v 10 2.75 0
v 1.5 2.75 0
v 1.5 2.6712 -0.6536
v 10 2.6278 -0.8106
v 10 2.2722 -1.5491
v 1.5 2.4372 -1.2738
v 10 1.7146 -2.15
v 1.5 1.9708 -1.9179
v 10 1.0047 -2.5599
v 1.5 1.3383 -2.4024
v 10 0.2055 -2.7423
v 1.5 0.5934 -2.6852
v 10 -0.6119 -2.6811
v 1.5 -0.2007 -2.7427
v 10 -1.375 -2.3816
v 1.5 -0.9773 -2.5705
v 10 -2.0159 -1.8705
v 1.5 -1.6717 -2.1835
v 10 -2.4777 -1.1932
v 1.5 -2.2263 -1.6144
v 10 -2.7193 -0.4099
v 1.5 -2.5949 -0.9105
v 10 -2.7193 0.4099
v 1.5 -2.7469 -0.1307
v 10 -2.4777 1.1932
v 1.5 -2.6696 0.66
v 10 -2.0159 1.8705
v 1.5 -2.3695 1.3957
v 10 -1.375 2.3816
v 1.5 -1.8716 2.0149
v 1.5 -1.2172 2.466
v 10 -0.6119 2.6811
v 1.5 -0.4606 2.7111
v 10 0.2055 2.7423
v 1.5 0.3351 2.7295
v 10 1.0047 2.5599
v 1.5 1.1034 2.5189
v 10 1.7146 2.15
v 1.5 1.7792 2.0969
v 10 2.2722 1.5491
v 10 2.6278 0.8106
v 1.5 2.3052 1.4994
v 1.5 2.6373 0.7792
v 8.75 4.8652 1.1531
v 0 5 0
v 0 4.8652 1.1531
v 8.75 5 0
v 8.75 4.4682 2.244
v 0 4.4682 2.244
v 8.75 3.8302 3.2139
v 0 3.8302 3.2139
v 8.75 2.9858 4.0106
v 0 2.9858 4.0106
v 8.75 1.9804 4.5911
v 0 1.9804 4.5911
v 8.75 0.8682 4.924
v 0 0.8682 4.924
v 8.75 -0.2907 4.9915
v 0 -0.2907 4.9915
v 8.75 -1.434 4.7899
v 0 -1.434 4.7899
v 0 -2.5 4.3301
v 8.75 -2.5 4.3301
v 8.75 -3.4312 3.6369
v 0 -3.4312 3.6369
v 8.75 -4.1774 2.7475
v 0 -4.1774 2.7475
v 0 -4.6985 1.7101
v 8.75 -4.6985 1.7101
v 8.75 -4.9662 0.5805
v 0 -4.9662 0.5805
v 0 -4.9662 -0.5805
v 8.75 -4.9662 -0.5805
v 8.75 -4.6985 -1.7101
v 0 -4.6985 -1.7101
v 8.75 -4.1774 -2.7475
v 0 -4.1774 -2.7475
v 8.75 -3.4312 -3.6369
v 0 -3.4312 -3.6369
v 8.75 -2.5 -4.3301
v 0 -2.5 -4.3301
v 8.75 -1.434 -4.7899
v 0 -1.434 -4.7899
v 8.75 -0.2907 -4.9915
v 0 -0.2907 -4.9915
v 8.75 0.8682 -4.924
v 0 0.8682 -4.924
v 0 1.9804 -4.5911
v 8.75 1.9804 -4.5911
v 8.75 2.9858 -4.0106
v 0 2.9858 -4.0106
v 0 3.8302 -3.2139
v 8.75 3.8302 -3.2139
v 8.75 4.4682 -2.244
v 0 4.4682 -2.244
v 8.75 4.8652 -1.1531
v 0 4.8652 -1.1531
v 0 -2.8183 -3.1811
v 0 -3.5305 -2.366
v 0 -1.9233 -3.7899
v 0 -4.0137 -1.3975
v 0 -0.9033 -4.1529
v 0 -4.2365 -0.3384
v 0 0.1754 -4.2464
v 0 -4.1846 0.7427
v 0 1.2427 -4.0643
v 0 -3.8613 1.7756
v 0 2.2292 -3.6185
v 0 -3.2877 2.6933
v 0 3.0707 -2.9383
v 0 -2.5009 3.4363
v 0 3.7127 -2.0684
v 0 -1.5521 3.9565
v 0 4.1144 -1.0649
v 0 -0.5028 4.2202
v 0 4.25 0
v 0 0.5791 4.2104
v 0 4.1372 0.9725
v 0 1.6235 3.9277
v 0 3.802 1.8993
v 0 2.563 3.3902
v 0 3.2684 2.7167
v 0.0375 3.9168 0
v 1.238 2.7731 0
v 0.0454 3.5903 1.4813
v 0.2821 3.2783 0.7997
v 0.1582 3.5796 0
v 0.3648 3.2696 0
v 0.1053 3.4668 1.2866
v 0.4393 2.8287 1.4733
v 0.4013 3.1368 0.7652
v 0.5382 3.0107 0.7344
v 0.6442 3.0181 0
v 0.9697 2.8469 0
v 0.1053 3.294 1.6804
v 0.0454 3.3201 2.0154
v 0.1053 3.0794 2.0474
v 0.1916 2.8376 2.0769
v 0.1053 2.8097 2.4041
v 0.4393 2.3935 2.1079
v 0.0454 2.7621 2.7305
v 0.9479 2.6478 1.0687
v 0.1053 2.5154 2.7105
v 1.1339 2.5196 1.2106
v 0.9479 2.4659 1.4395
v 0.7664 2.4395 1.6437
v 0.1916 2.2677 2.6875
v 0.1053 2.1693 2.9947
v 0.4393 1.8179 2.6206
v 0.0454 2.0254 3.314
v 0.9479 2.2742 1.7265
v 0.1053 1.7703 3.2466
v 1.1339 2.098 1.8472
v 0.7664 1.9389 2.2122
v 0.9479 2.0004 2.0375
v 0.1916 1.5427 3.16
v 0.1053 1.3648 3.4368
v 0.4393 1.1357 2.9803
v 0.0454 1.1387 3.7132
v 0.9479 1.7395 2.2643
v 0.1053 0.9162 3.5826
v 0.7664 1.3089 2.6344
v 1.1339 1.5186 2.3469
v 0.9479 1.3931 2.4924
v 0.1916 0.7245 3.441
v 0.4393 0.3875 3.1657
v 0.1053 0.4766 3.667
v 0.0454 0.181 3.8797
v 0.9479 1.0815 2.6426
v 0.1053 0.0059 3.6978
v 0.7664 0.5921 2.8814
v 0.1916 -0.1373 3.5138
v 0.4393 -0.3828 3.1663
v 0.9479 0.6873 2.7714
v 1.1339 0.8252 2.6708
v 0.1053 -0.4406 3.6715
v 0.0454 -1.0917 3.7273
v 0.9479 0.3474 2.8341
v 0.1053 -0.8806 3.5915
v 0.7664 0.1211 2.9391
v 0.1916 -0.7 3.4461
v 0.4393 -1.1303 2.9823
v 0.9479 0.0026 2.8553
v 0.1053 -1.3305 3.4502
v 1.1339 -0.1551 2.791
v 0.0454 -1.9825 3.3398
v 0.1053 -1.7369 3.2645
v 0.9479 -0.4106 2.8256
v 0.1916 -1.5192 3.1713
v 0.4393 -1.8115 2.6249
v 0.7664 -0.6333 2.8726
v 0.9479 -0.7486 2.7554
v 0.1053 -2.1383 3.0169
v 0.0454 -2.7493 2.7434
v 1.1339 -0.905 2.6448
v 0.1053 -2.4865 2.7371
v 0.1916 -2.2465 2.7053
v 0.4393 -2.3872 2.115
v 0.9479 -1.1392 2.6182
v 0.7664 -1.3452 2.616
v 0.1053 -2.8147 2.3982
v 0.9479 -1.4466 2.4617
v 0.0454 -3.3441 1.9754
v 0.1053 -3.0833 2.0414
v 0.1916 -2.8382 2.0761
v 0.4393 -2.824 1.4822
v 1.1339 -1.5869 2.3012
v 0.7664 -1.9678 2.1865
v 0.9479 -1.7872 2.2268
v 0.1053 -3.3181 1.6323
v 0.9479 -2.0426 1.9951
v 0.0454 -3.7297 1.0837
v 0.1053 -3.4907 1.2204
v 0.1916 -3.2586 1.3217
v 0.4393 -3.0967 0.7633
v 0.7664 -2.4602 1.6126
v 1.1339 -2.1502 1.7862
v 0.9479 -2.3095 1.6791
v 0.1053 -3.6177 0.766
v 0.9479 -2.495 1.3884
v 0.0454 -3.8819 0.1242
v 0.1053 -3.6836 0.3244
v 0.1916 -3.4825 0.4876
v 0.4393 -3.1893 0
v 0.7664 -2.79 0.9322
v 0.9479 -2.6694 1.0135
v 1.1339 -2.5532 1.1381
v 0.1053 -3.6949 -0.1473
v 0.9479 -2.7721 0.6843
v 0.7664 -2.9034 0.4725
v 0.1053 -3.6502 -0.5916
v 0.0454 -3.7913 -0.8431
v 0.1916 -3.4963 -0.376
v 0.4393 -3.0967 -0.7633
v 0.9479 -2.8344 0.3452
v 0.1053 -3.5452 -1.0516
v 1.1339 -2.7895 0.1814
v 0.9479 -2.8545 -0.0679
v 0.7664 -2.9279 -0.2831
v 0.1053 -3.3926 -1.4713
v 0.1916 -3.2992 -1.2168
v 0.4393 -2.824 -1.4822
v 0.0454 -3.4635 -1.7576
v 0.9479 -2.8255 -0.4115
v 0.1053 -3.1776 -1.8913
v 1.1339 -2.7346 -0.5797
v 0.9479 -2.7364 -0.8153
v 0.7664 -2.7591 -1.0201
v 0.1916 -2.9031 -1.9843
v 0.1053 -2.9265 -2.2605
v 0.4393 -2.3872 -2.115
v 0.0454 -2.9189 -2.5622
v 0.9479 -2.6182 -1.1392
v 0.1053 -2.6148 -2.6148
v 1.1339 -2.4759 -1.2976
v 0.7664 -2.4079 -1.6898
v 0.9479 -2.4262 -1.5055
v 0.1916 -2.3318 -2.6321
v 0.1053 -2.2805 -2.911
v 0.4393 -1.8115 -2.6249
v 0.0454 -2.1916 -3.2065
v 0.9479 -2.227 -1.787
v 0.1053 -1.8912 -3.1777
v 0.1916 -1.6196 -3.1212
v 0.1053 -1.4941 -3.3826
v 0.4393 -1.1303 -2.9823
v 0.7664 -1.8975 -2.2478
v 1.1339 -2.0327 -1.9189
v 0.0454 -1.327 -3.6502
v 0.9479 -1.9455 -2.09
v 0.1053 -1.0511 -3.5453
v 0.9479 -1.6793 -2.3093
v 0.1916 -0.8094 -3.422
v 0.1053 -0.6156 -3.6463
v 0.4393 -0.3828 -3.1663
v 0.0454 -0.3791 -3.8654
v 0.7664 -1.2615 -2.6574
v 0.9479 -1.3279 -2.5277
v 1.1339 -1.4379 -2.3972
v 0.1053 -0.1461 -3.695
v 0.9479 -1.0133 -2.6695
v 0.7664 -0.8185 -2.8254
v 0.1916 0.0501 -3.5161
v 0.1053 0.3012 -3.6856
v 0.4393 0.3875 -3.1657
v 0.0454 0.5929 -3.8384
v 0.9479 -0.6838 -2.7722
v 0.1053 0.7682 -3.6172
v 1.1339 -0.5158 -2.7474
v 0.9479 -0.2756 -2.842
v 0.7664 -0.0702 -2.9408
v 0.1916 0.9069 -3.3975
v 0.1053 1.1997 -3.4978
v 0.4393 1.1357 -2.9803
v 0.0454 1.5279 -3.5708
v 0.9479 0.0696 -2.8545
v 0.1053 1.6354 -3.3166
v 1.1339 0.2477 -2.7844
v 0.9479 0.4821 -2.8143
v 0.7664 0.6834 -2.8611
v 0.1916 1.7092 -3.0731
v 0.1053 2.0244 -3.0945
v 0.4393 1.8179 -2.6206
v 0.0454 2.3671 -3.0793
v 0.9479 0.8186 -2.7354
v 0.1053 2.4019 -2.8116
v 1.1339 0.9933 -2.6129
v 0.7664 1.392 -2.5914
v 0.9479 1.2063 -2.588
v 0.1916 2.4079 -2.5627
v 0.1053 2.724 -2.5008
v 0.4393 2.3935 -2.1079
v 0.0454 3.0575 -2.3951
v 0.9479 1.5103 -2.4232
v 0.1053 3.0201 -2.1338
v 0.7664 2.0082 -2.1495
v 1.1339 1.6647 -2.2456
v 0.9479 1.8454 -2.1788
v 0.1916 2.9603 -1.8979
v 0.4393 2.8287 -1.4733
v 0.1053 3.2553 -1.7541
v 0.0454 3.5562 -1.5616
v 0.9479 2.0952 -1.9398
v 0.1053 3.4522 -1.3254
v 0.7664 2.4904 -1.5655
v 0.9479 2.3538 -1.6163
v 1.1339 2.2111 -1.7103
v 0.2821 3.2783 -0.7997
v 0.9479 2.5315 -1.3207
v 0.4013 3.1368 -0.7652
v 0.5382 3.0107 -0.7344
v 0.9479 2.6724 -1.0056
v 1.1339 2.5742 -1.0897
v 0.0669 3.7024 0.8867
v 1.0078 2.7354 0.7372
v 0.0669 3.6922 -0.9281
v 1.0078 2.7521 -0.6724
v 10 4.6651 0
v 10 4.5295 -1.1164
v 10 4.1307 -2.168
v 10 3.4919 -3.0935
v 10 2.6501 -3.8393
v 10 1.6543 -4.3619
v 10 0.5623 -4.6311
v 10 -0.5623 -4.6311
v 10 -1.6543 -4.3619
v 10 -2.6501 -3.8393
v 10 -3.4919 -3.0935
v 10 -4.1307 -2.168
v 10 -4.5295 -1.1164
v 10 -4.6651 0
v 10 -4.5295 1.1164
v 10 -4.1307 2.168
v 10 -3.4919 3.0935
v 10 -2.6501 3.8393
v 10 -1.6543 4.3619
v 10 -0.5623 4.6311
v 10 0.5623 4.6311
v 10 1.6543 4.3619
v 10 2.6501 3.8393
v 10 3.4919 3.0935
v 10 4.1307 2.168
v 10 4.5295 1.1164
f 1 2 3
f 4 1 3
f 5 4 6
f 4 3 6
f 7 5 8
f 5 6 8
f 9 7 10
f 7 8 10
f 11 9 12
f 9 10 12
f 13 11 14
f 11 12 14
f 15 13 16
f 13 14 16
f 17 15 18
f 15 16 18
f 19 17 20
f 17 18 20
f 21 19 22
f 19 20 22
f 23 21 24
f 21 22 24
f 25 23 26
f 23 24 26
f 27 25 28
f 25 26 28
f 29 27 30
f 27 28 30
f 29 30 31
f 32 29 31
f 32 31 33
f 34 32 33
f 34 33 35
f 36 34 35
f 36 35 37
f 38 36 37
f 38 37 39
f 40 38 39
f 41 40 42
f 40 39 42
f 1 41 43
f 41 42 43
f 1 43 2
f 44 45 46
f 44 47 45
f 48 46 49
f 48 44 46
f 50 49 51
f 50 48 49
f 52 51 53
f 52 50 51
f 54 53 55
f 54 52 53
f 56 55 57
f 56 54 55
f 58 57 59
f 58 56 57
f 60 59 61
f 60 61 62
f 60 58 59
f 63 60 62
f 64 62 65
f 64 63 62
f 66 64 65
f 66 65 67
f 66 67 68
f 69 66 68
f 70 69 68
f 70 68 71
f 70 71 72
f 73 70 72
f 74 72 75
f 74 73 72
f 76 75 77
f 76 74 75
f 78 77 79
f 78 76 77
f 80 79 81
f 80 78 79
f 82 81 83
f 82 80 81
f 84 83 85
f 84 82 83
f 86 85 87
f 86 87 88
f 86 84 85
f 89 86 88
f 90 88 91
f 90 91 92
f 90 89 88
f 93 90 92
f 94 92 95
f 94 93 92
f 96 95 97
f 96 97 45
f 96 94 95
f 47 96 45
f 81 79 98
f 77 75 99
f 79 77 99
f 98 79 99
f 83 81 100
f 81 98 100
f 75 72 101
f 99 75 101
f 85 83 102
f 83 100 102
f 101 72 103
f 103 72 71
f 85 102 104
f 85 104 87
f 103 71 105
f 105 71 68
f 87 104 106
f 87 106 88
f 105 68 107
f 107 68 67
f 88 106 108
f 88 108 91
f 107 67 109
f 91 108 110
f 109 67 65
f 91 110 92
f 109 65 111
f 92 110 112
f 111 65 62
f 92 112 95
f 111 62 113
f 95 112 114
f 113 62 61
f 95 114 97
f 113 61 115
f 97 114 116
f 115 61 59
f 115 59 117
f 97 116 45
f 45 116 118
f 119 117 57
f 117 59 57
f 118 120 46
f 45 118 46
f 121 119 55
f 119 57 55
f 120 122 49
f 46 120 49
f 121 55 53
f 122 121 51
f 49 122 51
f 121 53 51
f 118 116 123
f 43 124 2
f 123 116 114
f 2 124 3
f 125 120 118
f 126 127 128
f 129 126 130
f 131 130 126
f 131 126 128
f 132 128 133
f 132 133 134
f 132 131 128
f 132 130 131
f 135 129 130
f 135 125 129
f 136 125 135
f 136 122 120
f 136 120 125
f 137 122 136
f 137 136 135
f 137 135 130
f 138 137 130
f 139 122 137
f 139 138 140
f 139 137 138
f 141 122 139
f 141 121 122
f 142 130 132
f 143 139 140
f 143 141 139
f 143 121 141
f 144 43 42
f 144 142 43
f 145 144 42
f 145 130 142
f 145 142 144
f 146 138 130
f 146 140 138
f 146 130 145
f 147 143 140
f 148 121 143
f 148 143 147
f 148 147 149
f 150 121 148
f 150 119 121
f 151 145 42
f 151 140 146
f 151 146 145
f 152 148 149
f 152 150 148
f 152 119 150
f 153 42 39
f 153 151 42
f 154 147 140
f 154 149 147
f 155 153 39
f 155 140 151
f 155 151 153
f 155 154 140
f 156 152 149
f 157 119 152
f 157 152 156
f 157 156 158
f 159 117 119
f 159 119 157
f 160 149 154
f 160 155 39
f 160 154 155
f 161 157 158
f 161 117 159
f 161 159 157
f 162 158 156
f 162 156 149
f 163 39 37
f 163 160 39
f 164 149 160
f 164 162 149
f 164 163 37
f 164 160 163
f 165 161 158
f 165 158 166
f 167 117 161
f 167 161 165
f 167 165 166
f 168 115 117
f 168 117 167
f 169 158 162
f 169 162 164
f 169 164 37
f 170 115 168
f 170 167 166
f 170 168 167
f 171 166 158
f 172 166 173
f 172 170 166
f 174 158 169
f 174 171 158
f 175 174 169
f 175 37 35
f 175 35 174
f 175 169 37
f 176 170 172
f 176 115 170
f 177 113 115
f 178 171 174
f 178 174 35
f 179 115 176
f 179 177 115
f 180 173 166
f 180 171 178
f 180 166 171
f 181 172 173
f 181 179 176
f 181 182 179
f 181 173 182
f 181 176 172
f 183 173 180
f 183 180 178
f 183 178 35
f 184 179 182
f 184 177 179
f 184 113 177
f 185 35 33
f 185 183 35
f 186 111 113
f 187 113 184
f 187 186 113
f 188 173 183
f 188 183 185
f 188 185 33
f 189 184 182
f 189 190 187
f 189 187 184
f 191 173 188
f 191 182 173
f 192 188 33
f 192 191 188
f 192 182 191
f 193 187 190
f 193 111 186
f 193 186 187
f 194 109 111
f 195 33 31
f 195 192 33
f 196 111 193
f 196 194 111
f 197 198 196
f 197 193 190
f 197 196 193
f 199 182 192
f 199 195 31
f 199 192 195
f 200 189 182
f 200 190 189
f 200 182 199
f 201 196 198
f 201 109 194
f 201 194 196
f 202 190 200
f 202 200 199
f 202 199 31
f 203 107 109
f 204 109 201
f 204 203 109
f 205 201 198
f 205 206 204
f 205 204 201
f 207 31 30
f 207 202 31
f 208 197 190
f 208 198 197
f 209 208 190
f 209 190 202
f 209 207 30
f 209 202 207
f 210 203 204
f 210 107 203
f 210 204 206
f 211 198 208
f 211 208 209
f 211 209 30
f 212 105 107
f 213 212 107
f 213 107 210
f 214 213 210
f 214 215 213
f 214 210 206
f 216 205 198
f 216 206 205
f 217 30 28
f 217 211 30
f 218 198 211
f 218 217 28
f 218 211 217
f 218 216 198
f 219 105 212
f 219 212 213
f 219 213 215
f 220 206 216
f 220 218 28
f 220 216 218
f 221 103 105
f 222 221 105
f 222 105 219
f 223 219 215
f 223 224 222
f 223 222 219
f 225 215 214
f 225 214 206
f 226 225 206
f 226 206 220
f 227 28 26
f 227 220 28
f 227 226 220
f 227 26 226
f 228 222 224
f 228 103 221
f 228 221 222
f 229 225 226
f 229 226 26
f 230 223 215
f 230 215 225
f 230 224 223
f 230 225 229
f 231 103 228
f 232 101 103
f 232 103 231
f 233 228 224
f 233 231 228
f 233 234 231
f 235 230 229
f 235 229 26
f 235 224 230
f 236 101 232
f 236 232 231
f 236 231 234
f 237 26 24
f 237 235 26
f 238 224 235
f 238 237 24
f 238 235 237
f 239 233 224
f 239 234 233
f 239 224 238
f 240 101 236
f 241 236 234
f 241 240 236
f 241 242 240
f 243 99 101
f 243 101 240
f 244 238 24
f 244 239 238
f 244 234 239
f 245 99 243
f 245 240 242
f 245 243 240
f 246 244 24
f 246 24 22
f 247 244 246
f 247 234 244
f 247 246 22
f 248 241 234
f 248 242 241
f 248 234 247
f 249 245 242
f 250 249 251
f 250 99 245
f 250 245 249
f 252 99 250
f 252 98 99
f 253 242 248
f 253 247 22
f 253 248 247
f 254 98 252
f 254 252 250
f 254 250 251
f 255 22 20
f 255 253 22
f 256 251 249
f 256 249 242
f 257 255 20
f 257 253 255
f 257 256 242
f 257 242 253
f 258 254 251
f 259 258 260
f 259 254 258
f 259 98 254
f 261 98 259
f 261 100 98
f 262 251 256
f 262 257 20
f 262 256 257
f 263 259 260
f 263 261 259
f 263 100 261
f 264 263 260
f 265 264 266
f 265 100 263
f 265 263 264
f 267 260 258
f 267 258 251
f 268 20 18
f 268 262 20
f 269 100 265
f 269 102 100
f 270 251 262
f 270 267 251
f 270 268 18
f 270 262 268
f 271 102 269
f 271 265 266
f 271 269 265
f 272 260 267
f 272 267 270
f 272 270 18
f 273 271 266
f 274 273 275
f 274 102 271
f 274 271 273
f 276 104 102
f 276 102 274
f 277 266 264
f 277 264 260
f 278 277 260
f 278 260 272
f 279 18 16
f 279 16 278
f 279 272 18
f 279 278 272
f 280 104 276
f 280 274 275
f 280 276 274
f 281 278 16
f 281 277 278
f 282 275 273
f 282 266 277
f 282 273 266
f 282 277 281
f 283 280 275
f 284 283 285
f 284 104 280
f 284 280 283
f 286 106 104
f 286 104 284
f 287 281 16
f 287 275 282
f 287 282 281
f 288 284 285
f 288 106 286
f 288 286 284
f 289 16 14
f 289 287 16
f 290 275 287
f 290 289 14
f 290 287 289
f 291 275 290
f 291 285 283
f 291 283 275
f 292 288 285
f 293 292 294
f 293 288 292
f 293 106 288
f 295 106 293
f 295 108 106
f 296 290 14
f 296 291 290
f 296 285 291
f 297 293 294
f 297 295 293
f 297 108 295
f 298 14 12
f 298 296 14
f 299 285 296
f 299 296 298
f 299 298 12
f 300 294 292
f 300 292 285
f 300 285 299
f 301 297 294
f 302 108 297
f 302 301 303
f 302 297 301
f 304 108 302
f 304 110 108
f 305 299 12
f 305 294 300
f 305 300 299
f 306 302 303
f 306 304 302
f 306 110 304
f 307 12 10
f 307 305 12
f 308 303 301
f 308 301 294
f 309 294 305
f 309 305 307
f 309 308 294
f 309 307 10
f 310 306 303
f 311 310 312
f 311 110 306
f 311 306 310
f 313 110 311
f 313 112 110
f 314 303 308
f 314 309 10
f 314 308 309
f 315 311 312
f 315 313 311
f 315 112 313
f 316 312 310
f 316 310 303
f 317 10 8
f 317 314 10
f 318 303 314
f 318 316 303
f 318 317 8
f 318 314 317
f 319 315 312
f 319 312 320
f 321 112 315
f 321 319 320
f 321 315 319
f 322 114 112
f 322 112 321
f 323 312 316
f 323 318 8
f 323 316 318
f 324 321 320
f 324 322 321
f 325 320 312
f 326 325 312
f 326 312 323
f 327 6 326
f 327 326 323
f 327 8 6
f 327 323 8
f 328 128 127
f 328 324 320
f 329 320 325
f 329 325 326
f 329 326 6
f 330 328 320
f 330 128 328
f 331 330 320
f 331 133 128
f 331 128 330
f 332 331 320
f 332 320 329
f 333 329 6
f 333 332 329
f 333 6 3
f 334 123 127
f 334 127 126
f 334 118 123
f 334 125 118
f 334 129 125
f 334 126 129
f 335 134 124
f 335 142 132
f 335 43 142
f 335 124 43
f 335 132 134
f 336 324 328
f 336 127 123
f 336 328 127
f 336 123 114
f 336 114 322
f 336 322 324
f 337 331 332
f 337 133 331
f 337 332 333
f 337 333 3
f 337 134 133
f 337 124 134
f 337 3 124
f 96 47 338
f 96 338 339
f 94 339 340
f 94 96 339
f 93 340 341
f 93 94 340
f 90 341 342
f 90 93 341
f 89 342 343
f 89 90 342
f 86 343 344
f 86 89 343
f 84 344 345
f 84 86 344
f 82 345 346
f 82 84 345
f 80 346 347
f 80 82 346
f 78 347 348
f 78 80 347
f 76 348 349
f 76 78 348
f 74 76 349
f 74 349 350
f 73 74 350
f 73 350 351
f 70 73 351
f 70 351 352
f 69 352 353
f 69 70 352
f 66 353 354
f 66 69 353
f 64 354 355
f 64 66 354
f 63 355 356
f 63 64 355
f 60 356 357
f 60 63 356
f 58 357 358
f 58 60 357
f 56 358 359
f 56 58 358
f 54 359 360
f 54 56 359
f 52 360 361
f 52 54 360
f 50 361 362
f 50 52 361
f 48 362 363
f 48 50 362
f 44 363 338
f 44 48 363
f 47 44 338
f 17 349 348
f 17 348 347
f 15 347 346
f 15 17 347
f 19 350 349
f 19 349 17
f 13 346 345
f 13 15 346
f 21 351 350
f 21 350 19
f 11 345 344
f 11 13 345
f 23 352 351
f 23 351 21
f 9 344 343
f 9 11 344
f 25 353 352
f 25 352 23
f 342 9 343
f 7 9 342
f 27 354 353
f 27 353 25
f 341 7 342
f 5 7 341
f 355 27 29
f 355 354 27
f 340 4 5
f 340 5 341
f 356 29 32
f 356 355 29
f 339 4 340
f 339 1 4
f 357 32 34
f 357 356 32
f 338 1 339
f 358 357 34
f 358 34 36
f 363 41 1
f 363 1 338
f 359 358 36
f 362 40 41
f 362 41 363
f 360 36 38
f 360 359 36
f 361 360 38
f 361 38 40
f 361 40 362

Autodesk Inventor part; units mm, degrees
ref_plane "YZ Plane" through (0, 0, 0) normal (1, 0, 0) x (0, 1, 0)
ref_plane "XZ Plane" through (0, 0, 0) normal (0, 1, 0) x (-1, 0, 0)
ref_plane "XY Plane" through (0, 0, 0) normal (0, 0, 1) x (1, 0, 0)
sketch "Skizze1" plane through (0, 0, 0) normal (0, 0, 1) x (1, 0, 0)
  line L0 (0, 2.75) -> (0, 5)
  line L1 (0, 5) -> (10, 5)
  line L2 (10, 5) -> (10, 2.75)
  line L3 (10, 2.75) -> (0, 2.75)
  line L4 (-9.5331, 0) -> (16.2451, 0)
  line L5 (-14.6887, 0) -> (21.4008, 0) projected
  line L6 (0, -0.7) -> (0, 4.2) projected
  dimension "d0" = 10
  dimension "d1" = 5.5
  dimension "d2" = 10
revolve "Körper" add sketch "Skizze1" angle 360 about axis through (-9.5331, 0, 0) along (1, 0, 0)
chamfer "Fase1" distance 1.25 angle 15 1 edges at (10, -5, 0) measured on face at (3.3333, 4.9353, -0.8021)
fillet "Rundung1" radius 1.5 1 edges at (0, -2.75, 0)
equation "\"d6\" = PHH"
equation "\"d7\" = ANG"
equation "\"d13\" = PHH"
equation "\"d11\" = RR"
equation "\"d0\" = SD2"
equation "\"d1\" = NND"
equation "\"d2\" = NLG"
equation "\"NLG\" = 10"
equation "\"NND\" = 5.5"
equation "\"SD2\" = 10"
equation "\"PHH\" = 1.25"
equation "\"ANG\" = 15deg"
equation "\"RR\" = 1.5"
equation "\"NNDMAX\" = 6"
equation "\"NNDMIN\" = 5.1"
equation "\"SEWI\" = 30deg"
properties part number "DIN 179 - A 5,5 x 10" material "Stahl, weich"
